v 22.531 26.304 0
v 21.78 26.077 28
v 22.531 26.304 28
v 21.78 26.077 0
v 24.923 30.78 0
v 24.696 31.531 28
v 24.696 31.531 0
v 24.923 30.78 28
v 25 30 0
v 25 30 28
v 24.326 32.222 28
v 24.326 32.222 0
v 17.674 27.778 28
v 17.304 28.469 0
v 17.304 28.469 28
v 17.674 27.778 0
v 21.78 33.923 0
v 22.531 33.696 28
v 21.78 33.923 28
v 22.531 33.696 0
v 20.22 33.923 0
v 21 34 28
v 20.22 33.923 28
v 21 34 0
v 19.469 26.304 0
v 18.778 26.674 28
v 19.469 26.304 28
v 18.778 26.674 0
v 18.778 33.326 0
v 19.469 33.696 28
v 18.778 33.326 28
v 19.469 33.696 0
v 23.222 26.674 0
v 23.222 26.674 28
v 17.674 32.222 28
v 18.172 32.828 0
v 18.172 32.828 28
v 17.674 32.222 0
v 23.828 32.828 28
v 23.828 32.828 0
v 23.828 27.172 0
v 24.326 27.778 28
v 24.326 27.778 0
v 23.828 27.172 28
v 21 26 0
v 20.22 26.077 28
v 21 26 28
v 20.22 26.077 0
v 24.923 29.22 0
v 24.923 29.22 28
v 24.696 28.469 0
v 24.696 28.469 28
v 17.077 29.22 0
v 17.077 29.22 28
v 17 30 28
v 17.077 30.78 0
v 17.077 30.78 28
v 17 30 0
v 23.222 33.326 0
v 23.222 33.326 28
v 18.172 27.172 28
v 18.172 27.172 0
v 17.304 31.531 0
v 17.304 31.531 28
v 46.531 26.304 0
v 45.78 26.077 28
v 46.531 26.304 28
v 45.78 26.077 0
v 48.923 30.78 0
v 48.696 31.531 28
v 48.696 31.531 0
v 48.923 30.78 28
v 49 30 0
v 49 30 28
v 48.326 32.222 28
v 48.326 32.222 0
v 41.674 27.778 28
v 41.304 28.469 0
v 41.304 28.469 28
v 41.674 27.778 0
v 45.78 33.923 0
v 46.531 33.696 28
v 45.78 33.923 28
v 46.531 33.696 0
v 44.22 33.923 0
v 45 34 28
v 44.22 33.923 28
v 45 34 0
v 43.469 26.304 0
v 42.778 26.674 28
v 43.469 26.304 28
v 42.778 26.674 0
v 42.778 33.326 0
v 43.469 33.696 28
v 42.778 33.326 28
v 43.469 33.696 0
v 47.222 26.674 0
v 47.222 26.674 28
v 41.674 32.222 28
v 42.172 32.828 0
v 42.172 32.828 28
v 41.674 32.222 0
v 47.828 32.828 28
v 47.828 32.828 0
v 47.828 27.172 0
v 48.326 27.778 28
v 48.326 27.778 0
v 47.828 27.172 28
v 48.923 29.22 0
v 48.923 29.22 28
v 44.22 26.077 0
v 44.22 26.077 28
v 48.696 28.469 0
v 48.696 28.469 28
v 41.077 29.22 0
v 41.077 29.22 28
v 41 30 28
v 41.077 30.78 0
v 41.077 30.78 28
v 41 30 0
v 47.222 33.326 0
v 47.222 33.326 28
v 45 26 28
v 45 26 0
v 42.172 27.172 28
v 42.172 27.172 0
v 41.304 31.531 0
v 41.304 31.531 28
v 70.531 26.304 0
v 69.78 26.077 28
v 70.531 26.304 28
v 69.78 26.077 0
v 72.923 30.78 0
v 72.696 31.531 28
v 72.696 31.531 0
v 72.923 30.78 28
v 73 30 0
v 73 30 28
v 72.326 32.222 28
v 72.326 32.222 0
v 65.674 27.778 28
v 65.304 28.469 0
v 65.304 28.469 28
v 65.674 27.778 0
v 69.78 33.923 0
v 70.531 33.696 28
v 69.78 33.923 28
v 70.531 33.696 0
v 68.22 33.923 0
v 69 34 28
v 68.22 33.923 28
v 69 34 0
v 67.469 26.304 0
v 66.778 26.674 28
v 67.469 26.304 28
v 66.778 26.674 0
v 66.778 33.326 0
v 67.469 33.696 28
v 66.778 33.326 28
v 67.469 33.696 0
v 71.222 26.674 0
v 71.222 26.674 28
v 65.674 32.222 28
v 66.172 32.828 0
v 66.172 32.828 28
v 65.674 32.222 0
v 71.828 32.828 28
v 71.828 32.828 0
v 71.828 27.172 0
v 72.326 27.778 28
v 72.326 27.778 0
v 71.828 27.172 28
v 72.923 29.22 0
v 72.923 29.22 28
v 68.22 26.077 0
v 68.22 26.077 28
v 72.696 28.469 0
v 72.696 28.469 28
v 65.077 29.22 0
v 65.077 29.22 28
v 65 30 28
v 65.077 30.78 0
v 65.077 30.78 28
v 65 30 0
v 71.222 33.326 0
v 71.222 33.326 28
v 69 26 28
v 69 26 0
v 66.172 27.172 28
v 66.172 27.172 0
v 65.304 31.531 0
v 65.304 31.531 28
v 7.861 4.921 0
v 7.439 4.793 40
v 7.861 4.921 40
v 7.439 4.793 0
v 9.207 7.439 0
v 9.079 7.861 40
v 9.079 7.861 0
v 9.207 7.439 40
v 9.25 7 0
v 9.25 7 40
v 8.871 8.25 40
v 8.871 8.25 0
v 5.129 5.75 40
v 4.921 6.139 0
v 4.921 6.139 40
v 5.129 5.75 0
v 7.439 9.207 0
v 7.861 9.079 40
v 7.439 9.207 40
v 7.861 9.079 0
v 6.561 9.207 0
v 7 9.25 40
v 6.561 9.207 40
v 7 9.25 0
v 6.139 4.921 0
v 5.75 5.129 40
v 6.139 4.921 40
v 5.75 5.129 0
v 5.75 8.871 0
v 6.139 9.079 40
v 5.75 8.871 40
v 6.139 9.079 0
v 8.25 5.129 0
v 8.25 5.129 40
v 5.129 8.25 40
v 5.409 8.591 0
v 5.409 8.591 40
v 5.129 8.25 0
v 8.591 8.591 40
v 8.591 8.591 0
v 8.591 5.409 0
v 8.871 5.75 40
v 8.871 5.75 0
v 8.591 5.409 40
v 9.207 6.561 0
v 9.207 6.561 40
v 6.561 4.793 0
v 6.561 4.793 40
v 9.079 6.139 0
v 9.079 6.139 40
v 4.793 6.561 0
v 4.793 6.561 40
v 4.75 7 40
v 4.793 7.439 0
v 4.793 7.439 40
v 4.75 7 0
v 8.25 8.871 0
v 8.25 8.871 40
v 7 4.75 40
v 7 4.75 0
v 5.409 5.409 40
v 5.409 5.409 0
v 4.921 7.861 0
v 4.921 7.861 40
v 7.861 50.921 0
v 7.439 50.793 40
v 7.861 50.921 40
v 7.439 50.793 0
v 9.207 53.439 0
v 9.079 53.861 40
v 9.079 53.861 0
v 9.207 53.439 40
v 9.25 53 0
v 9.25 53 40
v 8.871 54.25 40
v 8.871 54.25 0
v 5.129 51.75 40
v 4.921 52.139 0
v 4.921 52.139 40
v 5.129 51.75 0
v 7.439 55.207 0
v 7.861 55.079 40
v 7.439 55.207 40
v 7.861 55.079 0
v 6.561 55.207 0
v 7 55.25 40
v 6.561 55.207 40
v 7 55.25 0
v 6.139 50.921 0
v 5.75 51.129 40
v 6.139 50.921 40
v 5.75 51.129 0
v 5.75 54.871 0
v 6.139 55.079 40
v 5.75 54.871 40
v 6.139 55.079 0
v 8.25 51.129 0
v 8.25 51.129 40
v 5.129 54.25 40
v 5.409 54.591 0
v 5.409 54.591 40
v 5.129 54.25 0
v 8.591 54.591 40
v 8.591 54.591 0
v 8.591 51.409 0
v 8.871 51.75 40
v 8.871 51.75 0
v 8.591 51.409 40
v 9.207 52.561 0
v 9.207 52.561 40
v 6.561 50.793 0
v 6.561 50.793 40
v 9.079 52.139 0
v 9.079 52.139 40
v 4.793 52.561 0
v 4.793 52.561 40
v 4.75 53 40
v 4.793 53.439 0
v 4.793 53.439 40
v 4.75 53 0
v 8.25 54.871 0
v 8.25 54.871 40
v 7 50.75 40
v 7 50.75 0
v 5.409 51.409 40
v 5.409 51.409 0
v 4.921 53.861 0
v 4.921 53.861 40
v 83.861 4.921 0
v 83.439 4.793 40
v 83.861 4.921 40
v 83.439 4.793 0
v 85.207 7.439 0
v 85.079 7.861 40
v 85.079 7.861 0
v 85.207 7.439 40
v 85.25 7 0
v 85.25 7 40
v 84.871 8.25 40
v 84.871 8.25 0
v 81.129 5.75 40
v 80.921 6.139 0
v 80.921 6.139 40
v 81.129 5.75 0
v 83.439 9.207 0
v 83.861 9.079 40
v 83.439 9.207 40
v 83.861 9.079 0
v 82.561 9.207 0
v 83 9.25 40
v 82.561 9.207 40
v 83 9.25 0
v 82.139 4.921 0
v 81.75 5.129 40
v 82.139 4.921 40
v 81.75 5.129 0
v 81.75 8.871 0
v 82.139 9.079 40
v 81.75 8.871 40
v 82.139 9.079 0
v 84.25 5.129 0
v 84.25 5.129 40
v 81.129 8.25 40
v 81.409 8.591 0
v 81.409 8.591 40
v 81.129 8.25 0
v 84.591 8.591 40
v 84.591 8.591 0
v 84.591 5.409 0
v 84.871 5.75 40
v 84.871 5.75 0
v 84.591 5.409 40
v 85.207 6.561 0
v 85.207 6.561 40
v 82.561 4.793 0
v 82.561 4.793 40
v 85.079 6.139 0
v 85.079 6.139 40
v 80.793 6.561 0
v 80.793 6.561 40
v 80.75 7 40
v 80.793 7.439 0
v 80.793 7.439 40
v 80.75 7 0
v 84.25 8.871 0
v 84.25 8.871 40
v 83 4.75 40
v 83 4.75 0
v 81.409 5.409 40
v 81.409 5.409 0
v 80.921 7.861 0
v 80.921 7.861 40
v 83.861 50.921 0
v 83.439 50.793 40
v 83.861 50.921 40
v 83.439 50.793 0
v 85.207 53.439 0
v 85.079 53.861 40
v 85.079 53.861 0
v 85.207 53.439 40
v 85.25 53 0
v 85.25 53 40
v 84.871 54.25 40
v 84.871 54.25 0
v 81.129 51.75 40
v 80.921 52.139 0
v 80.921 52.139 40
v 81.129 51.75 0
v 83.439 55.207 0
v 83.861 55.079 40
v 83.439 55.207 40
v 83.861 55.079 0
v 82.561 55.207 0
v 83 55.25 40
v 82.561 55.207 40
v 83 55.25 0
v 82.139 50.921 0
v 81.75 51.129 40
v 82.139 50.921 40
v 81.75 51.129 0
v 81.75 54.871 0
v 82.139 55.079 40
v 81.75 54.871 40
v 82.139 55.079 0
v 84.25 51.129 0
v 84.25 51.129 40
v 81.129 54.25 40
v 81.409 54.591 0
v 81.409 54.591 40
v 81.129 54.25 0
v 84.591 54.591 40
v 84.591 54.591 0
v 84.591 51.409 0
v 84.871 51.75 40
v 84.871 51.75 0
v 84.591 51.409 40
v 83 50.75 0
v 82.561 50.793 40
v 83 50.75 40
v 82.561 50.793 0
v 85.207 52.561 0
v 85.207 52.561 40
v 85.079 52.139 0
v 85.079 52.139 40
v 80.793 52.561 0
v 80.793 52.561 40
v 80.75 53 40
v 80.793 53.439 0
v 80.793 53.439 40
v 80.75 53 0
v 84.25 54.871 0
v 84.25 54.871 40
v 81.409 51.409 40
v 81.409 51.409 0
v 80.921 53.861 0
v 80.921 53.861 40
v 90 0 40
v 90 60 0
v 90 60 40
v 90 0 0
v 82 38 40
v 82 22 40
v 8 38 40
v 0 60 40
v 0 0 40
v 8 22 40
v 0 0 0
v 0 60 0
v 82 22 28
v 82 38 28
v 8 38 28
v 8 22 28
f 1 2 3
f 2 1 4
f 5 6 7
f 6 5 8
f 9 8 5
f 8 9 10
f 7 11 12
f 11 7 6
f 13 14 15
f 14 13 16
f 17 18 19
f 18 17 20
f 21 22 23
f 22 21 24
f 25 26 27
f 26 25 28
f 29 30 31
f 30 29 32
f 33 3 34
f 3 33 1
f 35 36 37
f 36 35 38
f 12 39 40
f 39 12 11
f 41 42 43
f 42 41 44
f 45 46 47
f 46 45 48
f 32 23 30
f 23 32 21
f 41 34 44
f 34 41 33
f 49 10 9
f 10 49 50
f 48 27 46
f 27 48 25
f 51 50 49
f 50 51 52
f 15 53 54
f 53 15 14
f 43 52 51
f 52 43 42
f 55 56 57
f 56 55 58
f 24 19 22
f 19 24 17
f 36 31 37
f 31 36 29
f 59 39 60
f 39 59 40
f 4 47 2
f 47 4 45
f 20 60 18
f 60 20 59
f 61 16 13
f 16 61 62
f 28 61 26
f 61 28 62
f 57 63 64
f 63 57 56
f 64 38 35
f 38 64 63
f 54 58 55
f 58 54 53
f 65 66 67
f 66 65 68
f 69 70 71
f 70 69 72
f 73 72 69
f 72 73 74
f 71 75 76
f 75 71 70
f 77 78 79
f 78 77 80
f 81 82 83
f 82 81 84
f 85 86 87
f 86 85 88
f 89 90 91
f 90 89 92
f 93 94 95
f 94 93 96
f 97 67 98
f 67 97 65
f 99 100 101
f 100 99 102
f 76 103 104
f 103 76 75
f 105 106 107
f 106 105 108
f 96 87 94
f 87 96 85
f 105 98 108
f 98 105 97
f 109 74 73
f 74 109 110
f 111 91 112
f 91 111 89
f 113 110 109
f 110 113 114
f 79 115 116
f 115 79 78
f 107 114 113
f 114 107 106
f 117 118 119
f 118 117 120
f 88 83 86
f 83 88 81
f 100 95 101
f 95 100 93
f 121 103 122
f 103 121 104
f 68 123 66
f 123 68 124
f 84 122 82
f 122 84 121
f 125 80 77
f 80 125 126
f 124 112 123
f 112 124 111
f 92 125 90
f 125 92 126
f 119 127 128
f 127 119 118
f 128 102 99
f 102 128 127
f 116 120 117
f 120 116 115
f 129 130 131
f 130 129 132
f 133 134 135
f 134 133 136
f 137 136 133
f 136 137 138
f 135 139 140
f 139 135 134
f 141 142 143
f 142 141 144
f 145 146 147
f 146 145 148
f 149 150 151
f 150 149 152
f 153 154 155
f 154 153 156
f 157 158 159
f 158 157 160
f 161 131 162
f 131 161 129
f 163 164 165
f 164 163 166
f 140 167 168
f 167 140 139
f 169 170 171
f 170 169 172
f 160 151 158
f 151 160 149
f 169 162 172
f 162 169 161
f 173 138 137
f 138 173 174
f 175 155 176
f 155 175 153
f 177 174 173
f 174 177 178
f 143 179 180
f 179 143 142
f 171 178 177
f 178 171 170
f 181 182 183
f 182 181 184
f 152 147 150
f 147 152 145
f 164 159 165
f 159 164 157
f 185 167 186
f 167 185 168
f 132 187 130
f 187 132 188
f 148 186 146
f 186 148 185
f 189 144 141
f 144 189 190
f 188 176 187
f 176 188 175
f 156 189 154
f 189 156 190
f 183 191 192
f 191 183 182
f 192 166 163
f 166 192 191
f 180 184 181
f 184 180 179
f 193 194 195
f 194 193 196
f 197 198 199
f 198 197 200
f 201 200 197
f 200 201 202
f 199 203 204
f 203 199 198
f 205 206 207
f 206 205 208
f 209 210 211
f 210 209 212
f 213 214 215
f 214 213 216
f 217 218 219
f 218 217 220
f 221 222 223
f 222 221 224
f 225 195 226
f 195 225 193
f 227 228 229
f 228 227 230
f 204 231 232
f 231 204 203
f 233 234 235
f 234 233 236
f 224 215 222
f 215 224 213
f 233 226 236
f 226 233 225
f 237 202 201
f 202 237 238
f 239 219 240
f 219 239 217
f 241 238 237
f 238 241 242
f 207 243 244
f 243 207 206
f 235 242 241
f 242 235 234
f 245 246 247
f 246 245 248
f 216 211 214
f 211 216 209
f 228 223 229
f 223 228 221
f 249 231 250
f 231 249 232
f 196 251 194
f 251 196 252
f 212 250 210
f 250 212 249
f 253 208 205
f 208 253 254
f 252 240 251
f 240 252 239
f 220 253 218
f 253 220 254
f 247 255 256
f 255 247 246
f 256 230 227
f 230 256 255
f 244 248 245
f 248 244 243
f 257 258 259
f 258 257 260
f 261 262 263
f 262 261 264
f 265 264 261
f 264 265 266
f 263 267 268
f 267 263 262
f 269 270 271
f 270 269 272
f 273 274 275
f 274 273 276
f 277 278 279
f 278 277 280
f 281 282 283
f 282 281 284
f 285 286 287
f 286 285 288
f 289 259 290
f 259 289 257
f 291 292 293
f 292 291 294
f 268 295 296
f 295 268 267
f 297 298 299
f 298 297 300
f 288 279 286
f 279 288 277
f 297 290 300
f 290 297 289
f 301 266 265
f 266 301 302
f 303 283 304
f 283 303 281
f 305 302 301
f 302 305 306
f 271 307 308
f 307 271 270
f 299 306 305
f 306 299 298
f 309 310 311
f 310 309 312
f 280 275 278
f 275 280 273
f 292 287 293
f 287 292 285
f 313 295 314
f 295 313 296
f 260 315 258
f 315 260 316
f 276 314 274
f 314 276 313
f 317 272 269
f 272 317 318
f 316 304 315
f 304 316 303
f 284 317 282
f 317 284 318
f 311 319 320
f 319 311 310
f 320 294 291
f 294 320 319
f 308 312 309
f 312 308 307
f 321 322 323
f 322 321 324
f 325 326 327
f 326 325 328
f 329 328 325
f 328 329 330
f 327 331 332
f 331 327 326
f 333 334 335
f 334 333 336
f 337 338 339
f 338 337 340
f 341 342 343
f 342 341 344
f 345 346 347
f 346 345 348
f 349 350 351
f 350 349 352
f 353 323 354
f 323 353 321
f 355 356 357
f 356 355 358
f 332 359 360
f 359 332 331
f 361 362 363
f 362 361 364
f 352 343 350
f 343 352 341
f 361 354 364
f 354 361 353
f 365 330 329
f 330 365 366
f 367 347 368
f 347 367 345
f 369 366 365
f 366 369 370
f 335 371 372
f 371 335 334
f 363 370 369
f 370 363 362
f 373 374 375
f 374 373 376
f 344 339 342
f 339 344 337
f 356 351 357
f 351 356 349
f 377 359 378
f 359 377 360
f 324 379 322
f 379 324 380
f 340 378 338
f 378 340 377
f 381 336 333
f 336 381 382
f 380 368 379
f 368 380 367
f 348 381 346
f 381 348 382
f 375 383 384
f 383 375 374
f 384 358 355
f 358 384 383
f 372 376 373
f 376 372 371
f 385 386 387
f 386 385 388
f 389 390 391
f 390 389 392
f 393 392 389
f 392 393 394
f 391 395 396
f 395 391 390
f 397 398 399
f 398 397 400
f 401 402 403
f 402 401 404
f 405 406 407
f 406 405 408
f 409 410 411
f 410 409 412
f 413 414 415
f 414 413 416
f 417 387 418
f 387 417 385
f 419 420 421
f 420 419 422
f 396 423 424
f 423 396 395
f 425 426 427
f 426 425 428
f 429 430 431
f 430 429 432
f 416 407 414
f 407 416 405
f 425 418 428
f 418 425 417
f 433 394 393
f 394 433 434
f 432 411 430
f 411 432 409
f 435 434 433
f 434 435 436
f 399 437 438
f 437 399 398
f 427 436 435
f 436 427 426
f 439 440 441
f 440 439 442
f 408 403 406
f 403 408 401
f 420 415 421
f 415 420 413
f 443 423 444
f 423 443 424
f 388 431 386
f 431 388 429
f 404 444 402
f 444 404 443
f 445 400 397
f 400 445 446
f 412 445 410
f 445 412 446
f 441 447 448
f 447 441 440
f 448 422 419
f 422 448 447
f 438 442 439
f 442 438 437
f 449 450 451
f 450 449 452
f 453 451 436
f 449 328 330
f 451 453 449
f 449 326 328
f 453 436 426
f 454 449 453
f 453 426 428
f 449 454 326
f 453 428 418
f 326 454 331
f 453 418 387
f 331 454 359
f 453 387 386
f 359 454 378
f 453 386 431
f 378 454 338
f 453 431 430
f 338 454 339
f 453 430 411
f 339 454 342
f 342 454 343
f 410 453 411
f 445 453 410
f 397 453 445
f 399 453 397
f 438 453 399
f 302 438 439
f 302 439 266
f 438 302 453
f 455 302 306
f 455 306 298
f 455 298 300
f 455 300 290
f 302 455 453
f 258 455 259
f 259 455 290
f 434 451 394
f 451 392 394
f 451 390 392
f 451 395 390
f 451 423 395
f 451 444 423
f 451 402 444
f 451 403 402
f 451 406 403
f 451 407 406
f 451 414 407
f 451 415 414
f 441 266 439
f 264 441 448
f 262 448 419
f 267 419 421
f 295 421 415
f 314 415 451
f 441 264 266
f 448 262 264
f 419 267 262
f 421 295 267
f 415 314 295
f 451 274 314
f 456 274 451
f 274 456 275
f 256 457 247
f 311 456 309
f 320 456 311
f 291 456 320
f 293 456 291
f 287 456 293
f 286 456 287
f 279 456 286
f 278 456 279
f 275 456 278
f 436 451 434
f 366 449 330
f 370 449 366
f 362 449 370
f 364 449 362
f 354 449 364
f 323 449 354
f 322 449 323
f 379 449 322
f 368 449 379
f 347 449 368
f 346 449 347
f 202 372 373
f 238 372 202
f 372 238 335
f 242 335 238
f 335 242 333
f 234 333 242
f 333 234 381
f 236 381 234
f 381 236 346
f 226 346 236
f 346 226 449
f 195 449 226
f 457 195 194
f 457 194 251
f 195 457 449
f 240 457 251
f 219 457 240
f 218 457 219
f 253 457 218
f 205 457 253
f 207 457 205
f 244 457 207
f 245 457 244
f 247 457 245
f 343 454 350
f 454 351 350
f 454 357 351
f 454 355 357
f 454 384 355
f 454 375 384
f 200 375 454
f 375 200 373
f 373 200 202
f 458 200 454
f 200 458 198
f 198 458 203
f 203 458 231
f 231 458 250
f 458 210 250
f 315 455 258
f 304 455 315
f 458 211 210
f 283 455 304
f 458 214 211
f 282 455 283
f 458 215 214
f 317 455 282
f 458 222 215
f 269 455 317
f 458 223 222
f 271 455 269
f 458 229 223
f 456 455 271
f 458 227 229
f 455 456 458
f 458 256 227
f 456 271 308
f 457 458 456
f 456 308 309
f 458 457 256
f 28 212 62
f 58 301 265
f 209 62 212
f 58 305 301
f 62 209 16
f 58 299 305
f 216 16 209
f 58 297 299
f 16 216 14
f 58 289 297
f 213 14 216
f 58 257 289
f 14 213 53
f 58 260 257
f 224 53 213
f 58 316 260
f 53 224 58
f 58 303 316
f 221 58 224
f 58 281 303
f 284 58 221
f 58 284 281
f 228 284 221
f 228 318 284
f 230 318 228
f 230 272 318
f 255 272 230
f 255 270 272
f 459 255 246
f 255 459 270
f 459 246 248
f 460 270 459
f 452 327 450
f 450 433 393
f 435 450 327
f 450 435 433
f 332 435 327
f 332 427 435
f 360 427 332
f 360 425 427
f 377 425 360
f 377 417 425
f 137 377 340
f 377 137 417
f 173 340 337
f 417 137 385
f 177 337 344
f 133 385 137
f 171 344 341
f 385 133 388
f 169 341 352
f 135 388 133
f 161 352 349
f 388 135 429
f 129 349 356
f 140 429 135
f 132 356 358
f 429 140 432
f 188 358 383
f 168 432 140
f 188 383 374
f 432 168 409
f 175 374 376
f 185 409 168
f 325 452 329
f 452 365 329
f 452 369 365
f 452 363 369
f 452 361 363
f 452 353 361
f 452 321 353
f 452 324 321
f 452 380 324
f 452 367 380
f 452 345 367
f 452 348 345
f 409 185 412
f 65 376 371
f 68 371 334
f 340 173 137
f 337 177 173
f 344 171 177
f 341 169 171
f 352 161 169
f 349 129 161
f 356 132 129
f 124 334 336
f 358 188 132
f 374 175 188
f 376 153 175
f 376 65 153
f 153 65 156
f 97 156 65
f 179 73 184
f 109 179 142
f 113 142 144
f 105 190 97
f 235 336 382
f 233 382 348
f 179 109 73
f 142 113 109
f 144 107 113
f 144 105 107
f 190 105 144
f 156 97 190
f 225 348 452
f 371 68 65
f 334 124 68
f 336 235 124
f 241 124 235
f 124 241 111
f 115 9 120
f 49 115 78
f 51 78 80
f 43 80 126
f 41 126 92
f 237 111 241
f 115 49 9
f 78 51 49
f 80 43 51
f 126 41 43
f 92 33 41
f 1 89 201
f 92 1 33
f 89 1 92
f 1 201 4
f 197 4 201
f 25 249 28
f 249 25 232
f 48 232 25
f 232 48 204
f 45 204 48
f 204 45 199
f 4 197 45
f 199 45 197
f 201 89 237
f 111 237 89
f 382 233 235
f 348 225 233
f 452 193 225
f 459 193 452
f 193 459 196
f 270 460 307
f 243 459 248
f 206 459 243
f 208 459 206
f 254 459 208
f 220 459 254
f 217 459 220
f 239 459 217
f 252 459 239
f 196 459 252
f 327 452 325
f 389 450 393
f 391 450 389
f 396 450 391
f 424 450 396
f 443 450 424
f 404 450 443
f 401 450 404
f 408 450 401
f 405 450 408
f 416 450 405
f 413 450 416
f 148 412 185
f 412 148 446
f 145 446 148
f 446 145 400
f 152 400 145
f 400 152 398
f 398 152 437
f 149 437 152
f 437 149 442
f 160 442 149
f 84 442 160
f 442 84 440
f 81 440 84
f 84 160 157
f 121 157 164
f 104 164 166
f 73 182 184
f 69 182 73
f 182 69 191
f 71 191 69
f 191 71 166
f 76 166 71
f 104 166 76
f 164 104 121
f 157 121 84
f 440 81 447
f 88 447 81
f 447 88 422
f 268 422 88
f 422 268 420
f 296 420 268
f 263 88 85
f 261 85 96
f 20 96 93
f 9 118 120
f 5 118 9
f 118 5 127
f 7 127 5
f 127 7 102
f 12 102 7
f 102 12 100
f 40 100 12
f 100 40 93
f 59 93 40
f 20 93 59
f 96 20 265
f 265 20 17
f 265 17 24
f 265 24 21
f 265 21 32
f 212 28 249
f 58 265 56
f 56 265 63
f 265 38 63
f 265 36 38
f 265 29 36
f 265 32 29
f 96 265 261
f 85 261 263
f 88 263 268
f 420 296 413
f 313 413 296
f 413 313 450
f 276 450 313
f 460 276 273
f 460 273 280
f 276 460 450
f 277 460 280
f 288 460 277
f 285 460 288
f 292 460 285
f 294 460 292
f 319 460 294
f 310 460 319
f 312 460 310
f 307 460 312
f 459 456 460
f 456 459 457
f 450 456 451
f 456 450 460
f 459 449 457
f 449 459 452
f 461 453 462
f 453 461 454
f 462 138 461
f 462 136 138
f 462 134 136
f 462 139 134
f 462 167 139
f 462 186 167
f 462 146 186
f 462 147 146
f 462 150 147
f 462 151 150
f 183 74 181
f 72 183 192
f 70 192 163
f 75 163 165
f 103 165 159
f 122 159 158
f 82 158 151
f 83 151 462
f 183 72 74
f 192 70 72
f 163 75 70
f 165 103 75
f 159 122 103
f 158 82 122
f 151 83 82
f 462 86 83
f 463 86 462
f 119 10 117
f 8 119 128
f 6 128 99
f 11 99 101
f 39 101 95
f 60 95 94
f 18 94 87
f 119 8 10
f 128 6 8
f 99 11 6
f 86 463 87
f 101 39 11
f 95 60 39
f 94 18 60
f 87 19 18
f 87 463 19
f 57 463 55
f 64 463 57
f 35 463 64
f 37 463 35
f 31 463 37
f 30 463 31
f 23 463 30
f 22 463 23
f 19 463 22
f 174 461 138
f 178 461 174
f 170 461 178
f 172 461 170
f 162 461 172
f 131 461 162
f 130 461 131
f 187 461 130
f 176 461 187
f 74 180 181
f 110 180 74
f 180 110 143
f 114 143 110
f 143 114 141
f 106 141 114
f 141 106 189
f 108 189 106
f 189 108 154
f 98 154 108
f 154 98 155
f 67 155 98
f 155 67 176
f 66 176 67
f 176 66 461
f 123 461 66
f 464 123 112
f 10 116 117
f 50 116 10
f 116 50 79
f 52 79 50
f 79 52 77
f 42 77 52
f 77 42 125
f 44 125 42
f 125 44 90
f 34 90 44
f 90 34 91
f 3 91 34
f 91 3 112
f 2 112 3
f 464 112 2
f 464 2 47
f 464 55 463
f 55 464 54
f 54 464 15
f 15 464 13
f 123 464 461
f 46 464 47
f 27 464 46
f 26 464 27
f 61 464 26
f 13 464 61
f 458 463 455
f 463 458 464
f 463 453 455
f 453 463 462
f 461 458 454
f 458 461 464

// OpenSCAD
$fn = 32;

// ----------------------------------------------------------------------
// Manifold block: gallery_top manifold
// ----------------------------------------------------------------------

// --- parameters (mm) ---
block_l = 90;             // block length, X
block_w = 60;             // block width, Y
block_h = 40;             // block height, Z
port_d = 8;               // port bore diameter
port_pitch = 24;          // port pitch along X
gallery_d = 16;           // top gallery width, Y
gallery_depth = 12;       // gallery pocket depth
wall_p = 8;               // gallery end wall thickness, X
mnt_d = 4.5;              // mounting hole diameter
mnt_in = 7;               // mounting hole inset from the edges

n_ports = 3;  // ports in the row
port_x0 = (block_l - (n_ports - 1) * port_pitch) / 2;  // first port X

difference() {
  cube([block_l, block_w, block_h]);
  for (i = [0 : n_ports - 1])
    translate([port_x0 + i * port_pitch, block_w / 2, -1])
      cylinder(h = block_h + 2, d = port_d);
  translate([wall_p, block_w / 2 - gallery_d / 2, block_h - gallery_depth])
    cube([block_l - 2 * wall_p, gallery_d, gallery_depth + 1]);
  for (cx = [mnt_in, block_l - mnt_in])
    for (cy = [mnt_in, block_w - mnt_in])
      translate([cx, cy, -1]) cylinder(h = block_h + 2, d = mnt_d);
}
